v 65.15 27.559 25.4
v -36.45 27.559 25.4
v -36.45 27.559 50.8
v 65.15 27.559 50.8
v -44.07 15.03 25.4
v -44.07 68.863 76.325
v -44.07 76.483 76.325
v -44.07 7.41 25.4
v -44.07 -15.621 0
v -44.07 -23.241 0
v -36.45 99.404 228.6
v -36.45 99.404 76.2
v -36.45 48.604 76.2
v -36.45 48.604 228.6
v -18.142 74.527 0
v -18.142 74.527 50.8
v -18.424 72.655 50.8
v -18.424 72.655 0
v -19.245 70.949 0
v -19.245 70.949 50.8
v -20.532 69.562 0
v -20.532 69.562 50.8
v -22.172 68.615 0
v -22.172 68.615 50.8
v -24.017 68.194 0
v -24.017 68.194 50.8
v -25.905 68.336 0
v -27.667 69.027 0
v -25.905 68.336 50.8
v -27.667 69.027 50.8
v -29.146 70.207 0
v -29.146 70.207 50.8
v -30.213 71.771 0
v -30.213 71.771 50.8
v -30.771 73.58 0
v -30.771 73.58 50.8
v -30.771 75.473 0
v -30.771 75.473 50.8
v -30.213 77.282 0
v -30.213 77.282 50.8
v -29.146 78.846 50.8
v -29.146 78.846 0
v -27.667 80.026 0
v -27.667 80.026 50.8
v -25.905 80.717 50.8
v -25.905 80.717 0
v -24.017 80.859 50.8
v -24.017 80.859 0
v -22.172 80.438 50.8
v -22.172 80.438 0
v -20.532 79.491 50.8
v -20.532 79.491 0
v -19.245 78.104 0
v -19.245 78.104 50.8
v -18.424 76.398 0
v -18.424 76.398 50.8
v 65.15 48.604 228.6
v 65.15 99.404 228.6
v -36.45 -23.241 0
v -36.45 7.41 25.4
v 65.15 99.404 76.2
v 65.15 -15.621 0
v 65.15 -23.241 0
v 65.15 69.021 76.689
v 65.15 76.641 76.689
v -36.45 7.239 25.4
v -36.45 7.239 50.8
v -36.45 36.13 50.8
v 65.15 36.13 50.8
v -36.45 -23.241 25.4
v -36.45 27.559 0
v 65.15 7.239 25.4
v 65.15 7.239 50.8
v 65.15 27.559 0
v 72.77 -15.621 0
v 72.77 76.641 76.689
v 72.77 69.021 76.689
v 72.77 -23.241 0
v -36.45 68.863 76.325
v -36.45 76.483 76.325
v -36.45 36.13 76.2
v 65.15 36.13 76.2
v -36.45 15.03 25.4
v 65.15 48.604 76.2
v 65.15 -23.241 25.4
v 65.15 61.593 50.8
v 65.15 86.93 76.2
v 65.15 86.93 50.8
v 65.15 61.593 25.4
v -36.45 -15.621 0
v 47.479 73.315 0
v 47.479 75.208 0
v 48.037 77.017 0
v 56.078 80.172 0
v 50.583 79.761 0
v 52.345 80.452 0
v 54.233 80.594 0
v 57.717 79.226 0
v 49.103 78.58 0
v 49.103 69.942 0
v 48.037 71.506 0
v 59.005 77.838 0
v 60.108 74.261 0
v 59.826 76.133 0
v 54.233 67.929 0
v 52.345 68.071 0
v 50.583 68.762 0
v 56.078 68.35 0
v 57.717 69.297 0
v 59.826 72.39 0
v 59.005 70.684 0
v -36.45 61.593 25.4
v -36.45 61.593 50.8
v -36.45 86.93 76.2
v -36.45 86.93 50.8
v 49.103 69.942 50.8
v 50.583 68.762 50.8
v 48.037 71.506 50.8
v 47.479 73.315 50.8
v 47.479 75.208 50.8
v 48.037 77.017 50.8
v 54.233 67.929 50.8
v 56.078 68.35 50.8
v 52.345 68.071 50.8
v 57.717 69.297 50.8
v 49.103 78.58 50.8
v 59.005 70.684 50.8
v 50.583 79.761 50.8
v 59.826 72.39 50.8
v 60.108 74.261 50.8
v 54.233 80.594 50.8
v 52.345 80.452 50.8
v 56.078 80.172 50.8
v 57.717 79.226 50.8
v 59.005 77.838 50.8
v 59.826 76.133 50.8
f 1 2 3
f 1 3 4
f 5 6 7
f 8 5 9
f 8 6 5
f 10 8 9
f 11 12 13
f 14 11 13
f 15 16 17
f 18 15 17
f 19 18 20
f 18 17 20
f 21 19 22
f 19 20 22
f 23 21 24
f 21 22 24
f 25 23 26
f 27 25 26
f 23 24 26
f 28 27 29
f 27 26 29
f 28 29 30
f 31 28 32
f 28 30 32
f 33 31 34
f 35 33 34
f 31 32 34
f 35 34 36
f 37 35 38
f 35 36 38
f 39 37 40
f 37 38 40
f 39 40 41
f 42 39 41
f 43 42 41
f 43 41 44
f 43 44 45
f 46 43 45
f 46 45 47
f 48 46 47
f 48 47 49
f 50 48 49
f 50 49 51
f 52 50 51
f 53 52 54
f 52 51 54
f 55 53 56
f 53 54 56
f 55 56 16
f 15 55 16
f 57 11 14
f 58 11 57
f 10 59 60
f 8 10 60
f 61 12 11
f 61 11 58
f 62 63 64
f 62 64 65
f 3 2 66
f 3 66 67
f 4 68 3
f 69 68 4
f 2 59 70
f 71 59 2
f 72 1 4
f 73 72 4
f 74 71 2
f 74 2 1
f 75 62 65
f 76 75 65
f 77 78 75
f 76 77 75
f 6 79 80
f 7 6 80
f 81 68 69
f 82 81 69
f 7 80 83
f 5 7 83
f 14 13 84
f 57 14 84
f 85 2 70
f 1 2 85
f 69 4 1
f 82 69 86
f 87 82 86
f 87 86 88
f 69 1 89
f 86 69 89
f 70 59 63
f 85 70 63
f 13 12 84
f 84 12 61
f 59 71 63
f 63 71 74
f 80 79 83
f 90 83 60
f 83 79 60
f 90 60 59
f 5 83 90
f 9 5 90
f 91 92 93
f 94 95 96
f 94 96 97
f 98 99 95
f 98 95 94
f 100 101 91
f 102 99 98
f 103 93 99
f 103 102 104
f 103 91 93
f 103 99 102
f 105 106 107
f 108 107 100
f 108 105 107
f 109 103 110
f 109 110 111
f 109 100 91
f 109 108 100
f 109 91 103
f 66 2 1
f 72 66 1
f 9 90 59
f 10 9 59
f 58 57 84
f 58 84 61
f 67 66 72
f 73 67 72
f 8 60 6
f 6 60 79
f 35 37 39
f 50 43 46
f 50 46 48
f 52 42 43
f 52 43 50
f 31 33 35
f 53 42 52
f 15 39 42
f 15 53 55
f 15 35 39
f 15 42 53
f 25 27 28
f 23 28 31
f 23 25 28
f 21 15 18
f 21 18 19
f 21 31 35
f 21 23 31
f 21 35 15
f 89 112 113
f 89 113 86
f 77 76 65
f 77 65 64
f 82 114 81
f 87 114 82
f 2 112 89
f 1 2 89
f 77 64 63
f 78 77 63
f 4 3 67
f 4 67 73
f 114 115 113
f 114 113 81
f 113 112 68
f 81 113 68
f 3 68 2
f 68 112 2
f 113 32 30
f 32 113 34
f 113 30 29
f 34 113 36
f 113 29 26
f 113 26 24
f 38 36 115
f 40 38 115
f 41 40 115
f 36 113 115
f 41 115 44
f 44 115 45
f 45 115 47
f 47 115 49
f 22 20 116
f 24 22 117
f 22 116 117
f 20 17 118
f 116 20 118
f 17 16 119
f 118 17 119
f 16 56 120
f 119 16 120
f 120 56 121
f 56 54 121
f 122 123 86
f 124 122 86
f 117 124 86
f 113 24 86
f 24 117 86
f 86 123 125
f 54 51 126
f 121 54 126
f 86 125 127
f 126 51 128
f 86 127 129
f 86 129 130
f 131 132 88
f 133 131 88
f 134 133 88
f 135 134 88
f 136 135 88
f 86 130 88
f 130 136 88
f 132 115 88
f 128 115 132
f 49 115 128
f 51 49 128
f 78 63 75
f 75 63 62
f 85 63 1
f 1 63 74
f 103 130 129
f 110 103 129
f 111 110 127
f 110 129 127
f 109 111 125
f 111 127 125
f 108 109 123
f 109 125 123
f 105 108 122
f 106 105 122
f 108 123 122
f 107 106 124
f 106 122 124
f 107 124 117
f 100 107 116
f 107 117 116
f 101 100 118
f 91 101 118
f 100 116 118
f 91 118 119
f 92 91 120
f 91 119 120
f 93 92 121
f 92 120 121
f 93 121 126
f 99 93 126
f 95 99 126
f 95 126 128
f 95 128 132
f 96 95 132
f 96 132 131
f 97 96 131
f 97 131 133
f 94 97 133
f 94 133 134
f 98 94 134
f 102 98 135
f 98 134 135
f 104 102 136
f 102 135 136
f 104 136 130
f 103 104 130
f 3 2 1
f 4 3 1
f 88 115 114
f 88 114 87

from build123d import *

# Parameters (mm, degrees)
F0_W      = 101.6
F0_H      = 50.8
F1_DEPTH  = 25.4
F2_W      = 101.6
F2_H      = 34.0341733113
F3_DEPTH  = 25.4
F4_DEPTH  = 20.32
F5_W      = 101.6
F5_H      = 25.337276049
F5_H_2    = 25.462723951
F6_DEPTH  = 25.4
F7_R      = 6.35
F8_DEPTH  = 50.8
F10_DEPTH = 7.62
F12_DEPTH = 7.62
F13_W     = 101.6
F13_H     = 12.4742165208
F13_H_2   = 38.3257834792
F14_DEPTH = 152.4


with BuildPart() as f1:
    # F0 (on Top) → F1 (new body)
    with BuildSketch(Plane.XY):
        with Locations((14.3503818924, 2.158543095)):
            Rectangle(F0_W, F0_H)
    extrude(amount=F1_DEPTH)


with BuildPart() as f3:
    # F2 (on face) → F3 (new body)
    with BuildSketch(Plane.XY.offset(25.4)):
        with Locations((14.3503818924, 44.5756297506)):
            Rectangle(F2_W, F2_H)
    extrude(amount=F3_DEPTH)


with BuildPart() as f4:
    # F4 (new): a face of the model
    f4_faces = [f3.part.faces().sort_by_distance(p)[0] for p in [
        (14.3503818924, 27.558543095, 38.1),
    ]]
    extrude(f4_faces, amount=F4_DEPTH)


with BuildPart() as f3_1:
    add(f3.part)

    # F5 (on face) → F6 (join)
    with BuildSketch(Plane.XY.offset(50.8)):
        with Locations((14.3503818924, 74.2613544308)):
            Rectangle(F5_W, F5_H)
        with Locations((14.3503818924, 48.8613544308)):
            Rectangle(F5_W, F5_H_2)
    extrude(amount=F6_DEPTH)

    # F7 (on face) → F8 (join)
    with BuildSketch(Plane(origin=(0, 0, 50.8), x_dir=(1, 0, 0), z_dir=(0, 0, -1))):
        with Locations((-24.4915038347, -74.5265334845)):
            Circle(F7_R)
        with Locations((53.7580810487, -74.2613544308)):
            Circle(F7_R)
    extrude(amount=F8_DEPTH)


with BuildPart() as f10:
    # F9 (on face) → F10 (new body)
    with BuildSketch(Plane.YZ.offset(65.1503818924)):
        Polygon((7.3164283732, 25.4), (-23.241456905, 0), (-15.621456905, 0), (14.9364283732, 25.4), align=None)
        Polygon((69.0208896995, 76.689325273), (7.3164283732, 25.4), (14.9364283732, 25.4), (76.6408896995, 76.689325273), align=None)
    extrude(amount=F10_DEPTH)


with BuildPart() as f12:
    # F11 (on face) → F12 (new body)
    with BuildSketch(Plane(origin=(-36.4496181076, 0, 0), x_dir=(0, -1, 0), z_dir=(-1, 0, 0))):
        Polygon((-15.0298775181, 25.4), (-7.4098775181, 25.4), (-68.8633617669, 76.3249769807), (-76.4833617669, 76.3249769807), align=None)
        Polygon((15.621456905, 0), (23.241456905, 0), (-7.4098775181, 25.4), (-15.0298775181, 25.4), align=None)
    extrude(amount=F12_DEPTH)


with BuildPart() as f14:
    # F13 (on face) → F14 (new body)
    with BuildSketch(Plane.XY.offset(76.2)):
        with Locations((14.3503818924, 93.1671007156)):
            Rectangle(F13_W, F13_H)
        with Locations((14.3503818924, 67.7671007156)):
            Rectangle(F13_W, F13_H_2)
    extrude(amount=F14_DEPTH)


solid = Compound([f1.part, f4.part, f3_1.part, f10.part, f12.part, f14.part])
